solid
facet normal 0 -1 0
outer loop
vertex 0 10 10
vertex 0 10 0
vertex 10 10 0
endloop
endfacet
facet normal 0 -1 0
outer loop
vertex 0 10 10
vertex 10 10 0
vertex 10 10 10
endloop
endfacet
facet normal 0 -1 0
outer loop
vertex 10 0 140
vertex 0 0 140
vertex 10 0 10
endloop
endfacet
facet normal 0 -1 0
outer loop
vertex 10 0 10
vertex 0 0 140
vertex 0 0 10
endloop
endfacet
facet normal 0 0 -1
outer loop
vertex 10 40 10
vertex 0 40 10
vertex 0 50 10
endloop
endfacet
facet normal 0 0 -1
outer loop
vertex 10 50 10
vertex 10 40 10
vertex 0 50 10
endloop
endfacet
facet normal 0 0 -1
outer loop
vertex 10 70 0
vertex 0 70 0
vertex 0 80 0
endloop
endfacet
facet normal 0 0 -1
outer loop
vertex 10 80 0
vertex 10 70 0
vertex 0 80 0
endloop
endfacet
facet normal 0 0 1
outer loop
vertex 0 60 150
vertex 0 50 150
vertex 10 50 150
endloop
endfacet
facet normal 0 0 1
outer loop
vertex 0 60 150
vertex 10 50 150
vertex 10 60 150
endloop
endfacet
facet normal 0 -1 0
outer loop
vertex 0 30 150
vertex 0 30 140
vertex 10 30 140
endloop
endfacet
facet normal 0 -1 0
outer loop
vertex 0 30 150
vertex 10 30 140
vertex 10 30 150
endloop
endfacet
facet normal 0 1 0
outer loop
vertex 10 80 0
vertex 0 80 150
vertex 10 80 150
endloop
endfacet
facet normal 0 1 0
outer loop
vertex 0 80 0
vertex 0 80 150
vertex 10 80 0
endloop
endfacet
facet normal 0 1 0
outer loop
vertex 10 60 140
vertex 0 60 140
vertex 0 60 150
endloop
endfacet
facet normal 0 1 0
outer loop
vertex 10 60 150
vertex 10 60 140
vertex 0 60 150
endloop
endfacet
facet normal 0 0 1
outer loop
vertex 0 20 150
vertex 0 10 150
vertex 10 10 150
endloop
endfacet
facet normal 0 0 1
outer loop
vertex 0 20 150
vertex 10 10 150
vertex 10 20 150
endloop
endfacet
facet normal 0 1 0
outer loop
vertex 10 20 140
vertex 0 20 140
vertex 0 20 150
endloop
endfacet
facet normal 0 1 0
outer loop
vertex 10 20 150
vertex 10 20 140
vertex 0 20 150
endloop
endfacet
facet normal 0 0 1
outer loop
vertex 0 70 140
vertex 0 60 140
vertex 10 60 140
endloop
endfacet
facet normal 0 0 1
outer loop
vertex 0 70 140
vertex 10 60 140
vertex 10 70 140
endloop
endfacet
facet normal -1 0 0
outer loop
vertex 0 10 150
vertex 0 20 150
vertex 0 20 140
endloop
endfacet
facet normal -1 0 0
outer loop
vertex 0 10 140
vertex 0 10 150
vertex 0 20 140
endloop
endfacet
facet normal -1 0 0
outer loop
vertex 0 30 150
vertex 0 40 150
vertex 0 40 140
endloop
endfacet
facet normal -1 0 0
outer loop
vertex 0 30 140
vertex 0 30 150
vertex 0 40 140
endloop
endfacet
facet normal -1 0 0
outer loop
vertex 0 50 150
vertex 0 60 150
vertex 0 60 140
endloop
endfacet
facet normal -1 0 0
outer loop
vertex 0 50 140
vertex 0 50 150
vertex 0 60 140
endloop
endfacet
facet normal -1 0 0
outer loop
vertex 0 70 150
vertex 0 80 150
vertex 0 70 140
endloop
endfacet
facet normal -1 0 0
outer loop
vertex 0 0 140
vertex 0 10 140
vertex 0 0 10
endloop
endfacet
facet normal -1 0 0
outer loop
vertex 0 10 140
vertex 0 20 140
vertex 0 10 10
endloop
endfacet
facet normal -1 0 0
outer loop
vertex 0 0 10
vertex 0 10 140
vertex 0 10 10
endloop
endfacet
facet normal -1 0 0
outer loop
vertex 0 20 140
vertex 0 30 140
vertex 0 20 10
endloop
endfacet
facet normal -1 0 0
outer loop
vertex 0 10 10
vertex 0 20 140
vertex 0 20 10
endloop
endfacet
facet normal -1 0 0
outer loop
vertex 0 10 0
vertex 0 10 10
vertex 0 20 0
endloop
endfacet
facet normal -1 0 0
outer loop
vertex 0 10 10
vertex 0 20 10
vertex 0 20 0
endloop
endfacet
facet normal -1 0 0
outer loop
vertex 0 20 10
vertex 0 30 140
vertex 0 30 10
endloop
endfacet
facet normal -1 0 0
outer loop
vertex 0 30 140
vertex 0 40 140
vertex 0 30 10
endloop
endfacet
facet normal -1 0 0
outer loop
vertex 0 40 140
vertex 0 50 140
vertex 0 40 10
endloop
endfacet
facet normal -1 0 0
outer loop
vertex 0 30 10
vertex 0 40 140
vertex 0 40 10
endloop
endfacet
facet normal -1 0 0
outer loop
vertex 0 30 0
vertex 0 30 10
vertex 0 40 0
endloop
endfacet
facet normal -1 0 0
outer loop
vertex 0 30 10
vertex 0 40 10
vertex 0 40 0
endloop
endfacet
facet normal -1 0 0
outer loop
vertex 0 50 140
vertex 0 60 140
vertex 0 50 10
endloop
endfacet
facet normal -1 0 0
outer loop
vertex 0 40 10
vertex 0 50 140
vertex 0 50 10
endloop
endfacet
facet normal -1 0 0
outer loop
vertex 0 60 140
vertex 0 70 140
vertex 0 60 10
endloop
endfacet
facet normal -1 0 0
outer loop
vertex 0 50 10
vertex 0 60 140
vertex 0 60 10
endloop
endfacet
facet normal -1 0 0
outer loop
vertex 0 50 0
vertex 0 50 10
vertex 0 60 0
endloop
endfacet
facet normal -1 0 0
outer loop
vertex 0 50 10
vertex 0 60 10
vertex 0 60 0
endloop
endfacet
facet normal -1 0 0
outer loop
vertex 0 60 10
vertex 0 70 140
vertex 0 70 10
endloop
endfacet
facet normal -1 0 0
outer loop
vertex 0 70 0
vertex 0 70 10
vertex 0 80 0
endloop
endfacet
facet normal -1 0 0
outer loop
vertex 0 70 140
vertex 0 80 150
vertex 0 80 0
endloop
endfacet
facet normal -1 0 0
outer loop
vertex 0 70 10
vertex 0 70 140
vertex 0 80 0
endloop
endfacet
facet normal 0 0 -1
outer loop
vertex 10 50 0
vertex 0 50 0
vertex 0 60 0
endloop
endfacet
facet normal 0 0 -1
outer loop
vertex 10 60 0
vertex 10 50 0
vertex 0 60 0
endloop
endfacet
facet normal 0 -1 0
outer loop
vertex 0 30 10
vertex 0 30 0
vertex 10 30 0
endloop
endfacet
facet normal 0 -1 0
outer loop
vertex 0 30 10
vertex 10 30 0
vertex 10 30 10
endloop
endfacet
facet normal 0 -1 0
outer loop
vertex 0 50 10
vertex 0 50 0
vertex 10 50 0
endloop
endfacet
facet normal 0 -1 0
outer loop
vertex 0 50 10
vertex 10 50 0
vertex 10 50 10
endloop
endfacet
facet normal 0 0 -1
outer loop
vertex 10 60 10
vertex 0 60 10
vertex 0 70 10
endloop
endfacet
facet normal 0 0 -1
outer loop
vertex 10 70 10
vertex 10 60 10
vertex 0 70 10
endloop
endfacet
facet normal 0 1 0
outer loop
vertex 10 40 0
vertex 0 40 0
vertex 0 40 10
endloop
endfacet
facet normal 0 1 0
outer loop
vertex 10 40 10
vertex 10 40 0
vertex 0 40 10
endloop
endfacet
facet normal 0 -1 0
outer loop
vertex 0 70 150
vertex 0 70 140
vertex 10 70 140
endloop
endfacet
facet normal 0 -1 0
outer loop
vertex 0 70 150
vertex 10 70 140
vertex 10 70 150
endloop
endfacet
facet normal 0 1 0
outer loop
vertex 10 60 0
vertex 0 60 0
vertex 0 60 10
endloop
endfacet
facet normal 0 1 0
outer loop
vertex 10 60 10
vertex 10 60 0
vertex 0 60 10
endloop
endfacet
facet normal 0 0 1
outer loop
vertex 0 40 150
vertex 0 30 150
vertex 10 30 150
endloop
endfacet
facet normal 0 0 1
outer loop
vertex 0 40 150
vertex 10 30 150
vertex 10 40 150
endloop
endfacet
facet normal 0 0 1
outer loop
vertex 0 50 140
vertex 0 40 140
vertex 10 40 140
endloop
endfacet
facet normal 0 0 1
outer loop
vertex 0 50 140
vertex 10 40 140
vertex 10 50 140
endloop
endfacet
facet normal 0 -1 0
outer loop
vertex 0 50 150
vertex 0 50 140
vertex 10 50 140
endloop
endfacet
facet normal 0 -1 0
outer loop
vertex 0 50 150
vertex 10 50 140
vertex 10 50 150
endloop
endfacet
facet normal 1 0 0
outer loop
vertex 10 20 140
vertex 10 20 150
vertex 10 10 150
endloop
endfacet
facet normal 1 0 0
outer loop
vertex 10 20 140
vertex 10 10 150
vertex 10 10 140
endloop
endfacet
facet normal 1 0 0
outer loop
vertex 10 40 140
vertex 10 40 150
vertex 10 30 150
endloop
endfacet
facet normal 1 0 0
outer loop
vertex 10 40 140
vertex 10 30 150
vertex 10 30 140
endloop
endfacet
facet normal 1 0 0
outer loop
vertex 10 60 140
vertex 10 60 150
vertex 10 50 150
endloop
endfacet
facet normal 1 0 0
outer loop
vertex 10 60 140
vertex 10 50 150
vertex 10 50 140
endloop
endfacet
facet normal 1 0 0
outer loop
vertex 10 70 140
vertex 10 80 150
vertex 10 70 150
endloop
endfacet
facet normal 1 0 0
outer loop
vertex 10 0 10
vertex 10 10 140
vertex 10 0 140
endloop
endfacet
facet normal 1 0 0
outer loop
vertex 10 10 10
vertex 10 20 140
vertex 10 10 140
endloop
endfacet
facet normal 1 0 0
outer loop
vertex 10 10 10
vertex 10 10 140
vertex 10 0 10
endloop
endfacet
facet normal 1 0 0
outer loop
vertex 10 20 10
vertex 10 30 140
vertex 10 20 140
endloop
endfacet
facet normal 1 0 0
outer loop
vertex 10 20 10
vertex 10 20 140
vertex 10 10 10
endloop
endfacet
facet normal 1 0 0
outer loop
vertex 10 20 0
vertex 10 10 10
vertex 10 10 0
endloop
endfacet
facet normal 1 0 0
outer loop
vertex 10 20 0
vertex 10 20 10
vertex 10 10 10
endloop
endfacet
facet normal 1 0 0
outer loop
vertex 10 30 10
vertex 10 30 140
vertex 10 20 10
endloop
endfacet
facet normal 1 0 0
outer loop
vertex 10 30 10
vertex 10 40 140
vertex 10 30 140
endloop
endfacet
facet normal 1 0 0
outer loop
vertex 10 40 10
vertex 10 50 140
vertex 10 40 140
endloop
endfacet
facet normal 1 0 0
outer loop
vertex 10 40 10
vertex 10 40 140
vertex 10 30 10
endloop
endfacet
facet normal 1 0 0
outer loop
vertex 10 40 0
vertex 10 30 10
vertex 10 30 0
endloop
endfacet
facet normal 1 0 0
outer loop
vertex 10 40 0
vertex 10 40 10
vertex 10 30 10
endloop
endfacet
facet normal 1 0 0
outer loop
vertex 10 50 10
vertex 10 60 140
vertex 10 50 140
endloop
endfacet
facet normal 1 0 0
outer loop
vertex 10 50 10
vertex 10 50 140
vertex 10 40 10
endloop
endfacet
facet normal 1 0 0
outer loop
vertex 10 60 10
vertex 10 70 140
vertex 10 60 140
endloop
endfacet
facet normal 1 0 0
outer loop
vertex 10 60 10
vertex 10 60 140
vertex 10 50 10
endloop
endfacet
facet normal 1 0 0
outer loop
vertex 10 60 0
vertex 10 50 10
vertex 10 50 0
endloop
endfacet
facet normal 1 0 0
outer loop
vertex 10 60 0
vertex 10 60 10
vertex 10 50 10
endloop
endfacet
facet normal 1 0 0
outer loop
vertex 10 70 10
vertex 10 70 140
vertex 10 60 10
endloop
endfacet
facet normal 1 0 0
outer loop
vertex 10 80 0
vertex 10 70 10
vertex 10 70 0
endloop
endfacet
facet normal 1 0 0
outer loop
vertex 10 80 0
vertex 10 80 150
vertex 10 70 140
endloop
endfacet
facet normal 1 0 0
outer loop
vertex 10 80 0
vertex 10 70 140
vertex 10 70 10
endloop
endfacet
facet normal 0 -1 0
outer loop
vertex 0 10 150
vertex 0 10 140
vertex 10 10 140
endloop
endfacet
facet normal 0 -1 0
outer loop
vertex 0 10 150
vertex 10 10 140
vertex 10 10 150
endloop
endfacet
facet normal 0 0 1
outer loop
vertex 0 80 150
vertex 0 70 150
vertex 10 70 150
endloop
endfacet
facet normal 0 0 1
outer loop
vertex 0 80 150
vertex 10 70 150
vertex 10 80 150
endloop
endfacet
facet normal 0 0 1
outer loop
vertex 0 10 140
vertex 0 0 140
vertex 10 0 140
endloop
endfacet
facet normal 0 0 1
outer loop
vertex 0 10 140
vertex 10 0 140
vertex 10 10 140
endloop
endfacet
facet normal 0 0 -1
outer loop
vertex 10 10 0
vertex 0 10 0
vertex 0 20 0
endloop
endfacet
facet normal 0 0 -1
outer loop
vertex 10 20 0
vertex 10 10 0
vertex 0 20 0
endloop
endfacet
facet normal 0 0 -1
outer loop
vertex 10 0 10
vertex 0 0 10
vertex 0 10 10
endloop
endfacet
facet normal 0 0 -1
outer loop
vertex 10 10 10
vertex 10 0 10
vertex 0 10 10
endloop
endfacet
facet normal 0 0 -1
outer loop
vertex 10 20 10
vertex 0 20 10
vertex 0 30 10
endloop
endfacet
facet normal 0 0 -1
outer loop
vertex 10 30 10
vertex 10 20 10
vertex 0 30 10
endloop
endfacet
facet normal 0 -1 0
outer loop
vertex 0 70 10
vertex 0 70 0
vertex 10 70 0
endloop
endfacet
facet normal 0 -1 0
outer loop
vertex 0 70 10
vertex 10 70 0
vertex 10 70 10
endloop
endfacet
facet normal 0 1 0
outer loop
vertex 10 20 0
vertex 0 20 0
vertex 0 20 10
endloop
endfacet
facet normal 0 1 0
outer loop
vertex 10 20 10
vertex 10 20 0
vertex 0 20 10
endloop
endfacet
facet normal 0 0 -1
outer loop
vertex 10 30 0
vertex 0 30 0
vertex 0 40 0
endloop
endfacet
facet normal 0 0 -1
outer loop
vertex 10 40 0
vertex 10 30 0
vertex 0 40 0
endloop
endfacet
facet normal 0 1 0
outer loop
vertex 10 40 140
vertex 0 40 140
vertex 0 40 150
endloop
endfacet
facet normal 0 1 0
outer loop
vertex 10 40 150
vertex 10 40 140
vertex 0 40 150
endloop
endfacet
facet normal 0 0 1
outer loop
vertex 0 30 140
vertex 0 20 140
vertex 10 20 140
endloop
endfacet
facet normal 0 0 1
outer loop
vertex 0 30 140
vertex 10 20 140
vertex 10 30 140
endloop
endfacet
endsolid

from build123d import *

# Parameters (mm, degrees)
ESQUISSE1_W                = 150
ESQUISSE1_H                = 80
BOSS_EXTRU_1_DEPTH         = 10
ESQUISSE2_W                = 10
ESQUISSE2_H                = 10
ENL_V_MAT_EXTRU_1_DEPTH    = 10
R_P_TITION_LIN_AIRE1_COUNT = 4
R_P_TITION_LIN_AIRE1_PITCH = 20


with BuildPart() as part:
    # Esquisse1 → Boss.-Extru.1 (new body)
    with BuildSketch(Plane(origin=(0, 0, 0), x_dir=(0, 0, -1), z_dir=(1, 0, 0))):
        with Locations((-75, 40)):
            Rectangle(ESQUISSE1_W, ESQUISSE1_H)
    extrude(amount=BOSS_EXTRU_1_DEPTH)

    # Esquisse2 → Enlèv. mat.-Extru.1 (cut)
    with BuildSketch(Plane.ZY):
        with Locations((5, 65)):
            Rectangle(ESQUISSE2_W, ESQUISSE2_H)
        with Locations((145, 65)):
            Rectangle(ESQUISSE2_W, ESQUISSE2_H)
    enl_v_mat_extru_1 = extrude(amount=-ENL_V_MAT_EXTRU_1_DEPTH, mode=Mode.SUBTRACT)

    # Répétition linéaire1: Enlèv. mat.-Extru.1 ×4
    with Locations(*[(0, -i * R_P_TITION_LIN_AIRE1_PITCH, 0) for i in range(1, R_P_TITION_LIN_AIRE1_COUNT)]):
        add(enl_v_mat_extru_1, mode=Mode.SUBTRACT)


solid = part.part
